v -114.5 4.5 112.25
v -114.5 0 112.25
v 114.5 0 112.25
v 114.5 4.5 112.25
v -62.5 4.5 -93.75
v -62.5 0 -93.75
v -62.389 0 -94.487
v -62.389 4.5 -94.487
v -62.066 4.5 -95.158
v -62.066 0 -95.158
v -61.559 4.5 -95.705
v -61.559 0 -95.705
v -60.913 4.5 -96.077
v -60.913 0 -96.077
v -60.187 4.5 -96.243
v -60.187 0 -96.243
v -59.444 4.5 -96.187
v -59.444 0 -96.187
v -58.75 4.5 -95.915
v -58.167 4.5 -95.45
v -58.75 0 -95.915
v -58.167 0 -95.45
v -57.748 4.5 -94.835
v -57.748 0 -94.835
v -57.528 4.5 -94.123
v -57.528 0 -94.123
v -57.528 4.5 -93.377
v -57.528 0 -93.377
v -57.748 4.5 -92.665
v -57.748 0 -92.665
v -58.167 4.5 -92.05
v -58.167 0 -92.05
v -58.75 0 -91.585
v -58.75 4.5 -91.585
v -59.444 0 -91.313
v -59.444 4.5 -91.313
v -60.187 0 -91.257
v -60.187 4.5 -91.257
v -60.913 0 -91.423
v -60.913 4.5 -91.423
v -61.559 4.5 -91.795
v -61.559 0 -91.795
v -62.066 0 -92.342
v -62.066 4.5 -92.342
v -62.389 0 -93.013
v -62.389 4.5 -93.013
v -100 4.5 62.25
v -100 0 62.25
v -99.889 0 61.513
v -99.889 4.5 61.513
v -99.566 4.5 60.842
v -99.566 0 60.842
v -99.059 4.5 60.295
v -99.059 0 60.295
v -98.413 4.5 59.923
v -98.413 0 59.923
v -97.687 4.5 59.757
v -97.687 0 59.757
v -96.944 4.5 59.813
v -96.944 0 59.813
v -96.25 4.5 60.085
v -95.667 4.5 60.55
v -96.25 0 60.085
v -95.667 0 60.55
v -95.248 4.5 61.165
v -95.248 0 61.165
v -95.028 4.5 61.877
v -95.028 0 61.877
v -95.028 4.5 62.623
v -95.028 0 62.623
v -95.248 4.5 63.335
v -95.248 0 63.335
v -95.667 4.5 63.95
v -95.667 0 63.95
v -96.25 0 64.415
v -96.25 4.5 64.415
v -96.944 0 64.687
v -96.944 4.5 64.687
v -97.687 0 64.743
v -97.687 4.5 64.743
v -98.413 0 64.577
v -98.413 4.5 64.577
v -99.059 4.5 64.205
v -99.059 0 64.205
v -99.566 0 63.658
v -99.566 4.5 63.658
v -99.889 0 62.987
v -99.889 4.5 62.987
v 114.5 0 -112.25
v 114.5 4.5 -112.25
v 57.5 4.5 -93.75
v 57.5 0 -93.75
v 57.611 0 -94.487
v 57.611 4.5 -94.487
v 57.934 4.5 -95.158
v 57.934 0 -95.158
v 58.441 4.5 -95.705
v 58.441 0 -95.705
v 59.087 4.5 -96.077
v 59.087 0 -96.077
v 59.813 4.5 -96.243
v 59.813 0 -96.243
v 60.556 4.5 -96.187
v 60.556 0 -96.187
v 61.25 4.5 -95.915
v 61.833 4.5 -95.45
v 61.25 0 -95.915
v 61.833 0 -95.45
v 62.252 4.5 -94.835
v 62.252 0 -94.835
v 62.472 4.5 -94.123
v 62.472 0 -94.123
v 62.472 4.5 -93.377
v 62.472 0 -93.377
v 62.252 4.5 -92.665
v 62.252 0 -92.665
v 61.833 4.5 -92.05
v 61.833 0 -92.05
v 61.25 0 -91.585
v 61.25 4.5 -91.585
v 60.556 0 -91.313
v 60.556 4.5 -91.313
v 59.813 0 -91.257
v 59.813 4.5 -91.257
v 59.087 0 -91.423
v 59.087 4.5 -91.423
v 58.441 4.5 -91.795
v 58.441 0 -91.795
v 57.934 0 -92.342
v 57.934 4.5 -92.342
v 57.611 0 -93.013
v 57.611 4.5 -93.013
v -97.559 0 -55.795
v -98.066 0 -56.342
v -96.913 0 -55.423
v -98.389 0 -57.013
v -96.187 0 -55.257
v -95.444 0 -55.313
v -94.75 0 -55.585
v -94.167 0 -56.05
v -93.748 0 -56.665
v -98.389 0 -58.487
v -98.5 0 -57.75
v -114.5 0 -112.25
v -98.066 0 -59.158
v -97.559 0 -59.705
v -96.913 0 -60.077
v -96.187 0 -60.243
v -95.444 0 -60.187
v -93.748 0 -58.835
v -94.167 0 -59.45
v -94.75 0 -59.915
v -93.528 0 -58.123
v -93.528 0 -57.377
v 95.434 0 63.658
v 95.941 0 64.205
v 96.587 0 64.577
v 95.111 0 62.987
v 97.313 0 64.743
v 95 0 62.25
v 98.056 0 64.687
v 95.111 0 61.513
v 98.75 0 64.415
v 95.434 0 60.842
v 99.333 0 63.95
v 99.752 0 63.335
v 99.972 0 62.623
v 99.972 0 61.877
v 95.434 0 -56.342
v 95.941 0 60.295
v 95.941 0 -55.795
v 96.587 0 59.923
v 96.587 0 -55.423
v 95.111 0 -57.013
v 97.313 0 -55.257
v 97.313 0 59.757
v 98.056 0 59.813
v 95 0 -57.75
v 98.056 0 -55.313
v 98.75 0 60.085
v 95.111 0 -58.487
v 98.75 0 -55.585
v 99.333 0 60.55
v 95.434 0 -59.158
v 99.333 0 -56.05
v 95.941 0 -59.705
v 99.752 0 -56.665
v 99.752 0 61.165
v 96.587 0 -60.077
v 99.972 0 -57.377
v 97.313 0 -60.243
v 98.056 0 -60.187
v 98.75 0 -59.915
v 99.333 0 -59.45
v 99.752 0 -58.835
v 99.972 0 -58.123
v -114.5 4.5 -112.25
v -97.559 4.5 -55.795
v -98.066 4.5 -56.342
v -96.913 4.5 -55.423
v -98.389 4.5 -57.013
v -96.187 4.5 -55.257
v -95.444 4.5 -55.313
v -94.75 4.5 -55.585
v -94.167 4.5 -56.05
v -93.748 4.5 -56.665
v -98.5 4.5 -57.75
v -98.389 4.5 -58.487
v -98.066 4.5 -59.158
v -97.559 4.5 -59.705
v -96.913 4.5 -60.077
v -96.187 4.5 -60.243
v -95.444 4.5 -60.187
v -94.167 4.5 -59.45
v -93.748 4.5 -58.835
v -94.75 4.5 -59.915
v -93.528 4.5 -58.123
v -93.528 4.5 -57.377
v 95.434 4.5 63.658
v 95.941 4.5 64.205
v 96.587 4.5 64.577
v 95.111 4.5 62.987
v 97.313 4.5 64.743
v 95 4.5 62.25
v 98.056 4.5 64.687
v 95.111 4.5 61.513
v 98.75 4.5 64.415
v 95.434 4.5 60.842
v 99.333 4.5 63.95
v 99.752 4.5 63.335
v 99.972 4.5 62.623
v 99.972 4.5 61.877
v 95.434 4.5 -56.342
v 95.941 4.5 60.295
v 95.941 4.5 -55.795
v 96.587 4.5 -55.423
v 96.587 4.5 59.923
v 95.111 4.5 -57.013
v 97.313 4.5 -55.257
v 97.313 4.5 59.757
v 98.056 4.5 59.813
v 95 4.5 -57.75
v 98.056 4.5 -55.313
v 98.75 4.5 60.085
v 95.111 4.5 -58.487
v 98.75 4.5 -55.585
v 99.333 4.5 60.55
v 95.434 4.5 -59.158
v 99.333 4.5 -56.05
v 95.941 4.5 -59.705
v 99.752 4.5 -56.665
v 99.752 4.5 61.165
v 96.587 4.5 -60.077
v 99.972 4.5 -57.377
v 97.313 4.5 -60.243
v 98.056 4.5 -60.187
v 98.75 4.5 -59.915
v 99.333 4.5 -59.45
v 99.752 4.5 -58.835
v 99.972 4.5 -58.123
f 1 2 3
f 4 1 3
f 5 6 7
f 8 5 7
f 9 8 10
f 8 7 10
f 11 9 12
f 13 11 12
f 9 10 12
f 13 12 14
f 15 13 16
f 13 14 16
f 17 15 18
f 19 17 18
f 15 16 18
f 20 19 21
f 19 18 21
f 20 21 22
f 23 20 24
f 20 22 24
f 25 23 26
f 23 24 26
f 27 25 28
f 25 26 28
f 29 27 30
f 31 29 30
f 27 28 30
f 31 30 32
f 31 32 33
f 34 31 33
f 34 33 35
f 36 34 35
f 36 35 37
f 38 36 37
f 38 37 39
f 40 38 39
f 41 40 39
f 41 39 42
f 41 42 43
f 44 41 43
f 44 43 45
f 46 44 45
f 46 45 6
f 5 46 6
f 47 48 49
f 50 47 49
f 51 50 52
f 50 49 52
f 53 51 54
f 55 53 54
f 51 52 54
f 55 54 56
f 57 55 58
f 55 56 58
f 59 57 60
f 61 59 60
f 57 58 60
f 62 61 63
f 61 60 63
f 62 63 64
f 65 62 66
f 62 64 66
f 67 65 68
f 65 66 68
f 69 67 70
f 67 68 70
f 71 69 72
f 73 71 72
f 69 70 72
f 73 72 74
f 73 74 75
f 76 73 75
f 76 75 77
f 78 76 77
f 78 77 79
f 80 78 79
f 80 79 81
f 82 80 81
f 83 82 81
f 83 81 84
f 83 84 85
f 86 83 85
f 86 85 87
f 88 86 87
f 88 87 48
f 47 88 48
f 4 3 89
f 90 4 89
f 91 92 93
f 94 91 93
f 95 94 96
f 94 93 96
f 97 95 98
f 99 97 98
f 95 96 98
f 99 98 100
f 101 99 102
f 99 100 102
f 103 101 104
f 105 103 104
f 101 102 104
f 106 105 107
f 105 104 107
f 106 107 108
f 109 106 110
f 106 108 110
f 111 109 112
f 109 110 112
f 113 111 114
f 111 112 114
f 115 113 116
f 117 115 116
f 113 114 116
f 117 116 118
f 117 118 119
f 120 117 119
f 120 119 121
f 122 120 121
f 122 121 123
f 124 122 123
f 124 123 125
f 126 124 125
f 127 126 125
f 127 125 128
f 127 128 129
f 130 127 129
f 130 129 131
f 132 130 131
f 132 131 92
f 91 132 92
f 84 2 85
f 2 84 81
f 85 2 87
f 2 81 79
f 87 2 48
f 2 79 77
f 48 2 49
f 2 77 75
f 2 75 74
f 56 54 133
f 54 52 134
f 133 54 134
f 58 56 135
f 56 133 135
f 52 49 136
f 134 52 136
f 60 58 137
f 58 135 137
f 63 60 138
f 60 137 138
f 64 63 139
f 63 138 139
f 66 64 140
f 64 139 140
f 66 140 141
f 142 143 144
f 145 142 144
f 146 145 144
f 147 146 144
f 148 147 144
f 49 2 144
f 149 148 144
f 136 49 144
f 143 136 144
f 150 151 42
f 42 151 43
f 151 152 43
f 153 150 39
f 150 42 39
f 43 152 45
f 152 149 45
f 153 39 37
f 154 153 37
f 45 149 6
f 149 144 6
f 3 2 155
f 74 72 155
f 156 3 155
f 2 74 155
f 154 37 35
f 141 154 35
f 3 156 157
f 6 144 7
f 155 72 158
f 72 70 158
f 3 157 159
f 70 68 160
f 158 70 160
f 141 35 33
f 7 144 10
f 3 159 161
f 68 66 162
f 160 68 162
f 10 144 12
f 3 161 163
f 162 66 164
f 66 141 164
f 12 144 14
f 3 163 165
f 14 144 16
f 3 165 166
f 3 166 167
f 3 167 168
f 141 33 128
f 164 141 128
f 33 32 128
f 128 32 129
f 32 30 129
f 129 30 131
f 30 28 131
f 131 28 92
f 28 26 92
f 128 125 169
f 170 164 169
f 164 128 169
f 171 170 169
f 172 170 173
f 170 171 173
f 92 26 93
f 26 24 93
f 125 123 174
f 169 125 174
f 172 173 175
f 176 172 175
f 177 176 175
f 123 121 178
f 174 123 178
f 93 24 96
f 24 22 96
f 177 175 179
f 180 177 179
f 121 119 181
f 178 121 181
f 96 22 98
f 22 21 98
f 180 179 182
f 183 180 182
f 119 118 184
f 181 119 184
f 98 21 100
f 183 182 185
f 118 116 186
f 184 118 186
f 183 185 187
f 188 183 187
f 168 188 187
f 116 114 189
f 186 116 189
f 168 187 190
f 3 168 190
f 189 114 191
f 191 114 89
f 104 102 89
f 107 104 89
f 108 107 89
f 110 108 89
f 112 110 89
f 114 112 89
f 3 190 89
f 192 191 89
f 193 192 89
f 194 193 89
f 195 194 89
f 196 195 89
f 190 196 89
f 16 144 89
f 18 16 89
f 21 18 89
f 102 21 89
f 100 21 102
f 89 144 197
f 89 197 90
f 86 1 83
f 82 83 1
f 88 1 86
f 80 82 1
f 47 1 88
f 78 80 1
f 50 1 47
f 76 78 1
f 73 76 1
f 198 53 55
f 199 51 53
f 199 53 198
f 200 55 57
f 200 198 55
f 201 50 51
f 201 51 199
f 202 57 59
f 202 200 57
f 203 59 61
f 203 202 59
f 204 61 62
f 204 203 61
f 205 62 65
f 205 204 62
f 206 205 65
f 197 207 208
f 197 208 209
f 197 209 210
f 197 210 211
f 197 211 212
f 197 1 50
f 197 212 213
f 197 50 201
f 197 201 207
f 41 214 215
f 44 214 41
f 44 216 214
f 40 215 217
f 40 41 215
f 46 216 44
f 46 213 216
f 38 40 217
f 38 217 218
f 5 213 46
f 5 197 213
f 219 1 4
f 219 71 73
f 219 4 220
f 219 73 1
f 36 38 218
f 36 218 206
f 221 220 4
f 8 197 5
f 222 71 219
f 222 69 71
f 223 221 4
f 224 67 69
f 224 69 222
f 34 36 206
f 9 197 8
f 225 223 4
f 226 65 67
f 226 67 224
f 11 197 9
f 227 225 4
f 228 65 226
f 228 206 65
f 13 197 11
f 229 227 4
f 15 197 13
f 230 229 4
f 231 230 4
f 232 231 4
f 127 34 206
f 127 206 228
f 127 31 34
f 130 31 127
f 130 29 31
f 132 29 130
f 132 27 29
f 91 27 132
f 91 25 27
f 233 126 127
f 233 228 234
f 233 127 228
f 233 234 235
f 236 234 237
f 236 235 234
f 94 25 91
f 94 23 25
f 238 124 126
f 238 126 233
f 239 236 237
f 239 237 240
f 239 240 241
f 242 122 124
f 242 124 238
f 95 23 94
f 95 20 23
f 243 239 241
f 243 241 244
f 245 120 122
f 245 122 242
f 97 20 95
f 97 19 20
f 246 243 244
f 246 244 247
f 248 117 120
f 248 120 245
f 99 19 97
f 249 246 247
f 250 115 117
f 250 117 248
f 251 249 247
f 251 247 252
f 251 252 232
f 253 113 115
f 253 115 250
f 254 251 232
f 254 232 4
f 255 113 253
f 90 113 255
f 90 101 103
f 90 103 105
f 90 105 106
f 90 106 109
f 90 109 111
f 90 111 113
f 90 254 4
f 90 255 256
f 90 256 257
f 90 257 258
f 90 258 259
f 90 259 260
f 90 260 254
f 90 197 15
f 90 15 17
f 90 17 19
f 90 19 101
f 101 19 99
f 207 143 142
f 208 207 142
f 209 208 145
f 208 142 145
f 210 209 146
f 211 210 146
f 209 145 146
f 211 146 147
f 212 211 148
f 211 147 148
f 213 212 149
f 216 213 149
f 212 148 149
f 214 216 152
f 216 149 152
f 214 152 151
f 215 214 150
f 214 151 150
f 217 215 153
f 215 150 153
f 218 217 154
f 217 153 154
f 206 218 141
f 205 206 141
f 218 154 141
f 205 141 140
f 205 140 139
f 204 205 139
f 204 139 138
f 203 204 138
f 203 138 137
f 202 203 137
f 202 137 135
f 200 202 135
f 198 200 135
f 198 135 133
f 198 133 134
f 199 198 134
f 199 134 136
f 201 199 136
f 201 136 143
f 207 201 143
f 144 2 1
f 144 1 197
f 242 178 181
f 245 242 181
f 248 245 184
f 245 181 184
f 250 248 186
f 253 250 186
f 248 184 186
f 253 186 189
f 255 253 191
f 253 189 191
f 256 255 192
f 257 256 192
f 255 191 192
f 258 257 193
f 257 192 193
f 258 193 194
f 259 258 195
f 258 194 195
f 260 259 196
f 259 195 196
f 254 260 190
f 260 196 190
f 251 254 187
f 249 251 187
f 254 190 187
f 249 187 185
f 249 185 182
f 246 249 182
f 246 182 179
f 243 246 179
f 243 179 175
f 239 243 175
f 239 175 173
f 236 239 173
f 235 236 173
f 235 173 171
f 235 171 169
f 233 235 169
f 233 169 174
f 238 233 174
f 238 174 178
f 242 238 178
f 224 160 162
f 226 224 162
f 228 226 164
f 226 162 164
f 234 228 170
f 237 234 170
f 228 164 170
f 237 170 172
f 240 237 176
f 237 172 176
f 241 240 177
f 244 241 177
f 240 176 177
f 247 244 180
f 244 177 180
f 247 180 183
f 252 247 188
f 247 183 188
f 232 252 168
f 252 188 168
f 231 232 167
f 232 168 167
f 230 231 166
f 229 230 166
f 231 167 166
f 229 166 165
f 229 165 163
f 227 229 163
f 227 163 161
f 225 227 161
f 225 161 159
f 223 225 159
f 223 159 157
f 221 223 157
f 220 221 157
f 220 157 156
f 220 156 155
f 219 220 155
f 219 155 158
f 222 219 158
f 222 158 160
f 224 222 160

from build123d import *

# Parameters (mm, degrees)
SKETCH1_W           = 229
SKETCH1_H           = 224.5
BOSS_EXTRUDE1_DEPTH = 4.5
CUT_EXTRUDE1_REACH  = 6.5
SKETCH2_R           = 2.5


with BuildPart() as part:
    # Sketch1 → Boss-Extrude1 (new body)
    with BuildSketch(Plane(origin=(0, 0, 0), x_dir=(1, 0, 0), z_dir=(0, 1, 0))):
        Rectangle(SKETCH1_W, SKETCH1_H)
    extrude(amount=BOSS_EXTRUDE1_DEPTH)

    # Sketch2 → Cut-Extrude1 (cut, up to next)
    with BuildSketch(Plane(origin=(0, 0, 0), x_dir=(-1, 0, 0), z_dir=(0, -1, 0)), mode=Mode.PRIVATE) as cut_extrude1_sk1:
        with Locations((97.5, -62.25)):
            Circle(SKETCH2_R)
    cut_extrude1_tool1 = extrude(cut_extrude1_sk1.sketch, amount=-CUT_EXTRUDE1_REACH, mode=Mode.PRIVATE) & part.part
    add(cut_extrude1_tool1.solids().sort_by_distance((-97.5, 0, 62.25))[0], mode=Mode.SUBTRACT)
    # Sketch2 → Cut-Extrude1 (cut, up to next)
    with BuildSketch(Plane(origin=(0, 0, 0), x_dir=(-1, 0, 0), z_dir=(0, -1, 0)), mode=Mode.PRIVATE) as cut_extrude1_sk2:
        with Locations((96, 57.75)):
            Circle(SKETCH2_R)
    cut_extrude1_tool2 = extrude(cut_extrude1_sk2.sketch, amount=-CUT_EXTRUDE1_REACH, mode=Mode.PRIVATE) & part.part
    add(cut_extrude1_tool2.solids().sort_by_distance((-96, 0, -57.75))[0], mode=Mode.SUBTRACT)
    # Sketch2 → Cut-Extrude1 (cut, up to next)
    with BuildSketch(Plane(origin=(0, 0, 0), x_dir=(-1, 0, 0), z_dir=(0, -1, 0)), mode=Mode.PRIVATE) as cut_extrude1_sk3:
        with Locations((60, 93.75)):
            Circle(SKETCH2_R)
    cut_extrude1_tool3 = extrude(cut_extrude1_sk3.sketch, amount=-CUT_EXTRUDE1_REACH, mode=Mode.PRIVATE) & part.part
    add(cut_extrude1_tool3.solids().sort_by_distance((-60, 0, -93.75))[0], mode=Mode.SUBTRACT)
    # Sketch2 → Cut-Extrude1 (cut, up to next)
    with BuildSketch(Plane(origin=(0, 0, 0), x_dir=(-1, 0, 0), z_dir=(0, -1, 0)), mode=Mode.PRIVATE) as cut_extrude1_sk4:
        with Locations((-60, 93.75)):
            Circle(SKETCH2_R)
    cut_extrude1_tool4 = extrude(cut_extrude1_sk4.sketch, amount=-CUT_EXTRUDE1_REACH, mode=Mode.PRIVATE) & part.part
    add(cut_extrude1_tool4.solids().sort_by_distance((60, 0, -93.75))[0], mode=Mode.SUBTRACT)
    # Sketch2 → Cut-Extrude1 (cut, up to next)
    with BuildSketch(Plane(origin=(0, 0, 0), x_dir=(-1, 0, 0), z_dir=(0, -1, 0)), mode=Mode.PRIVATE) as cut_extrude1_sk5:
        with Locations((-97.5, -62.25)):
            Circle(SKETCH2_R)
    cut_extrude1_tool5 = extrude(cut_extrude1_sk5.sketch, amount=-CUT_EXTRUDE1_REACH, mode=Mode.PRIVATE) & part.part
    add(cut_extrude1_tool5.solids().sort_by_distance((97.5, 0, 62.25))[0], mode=Mode.SUBTRACT)
    # Sketch2 → Cut-Extrude1 (cut, up to next)
    with BuildSketch(Plane(origin=(0, 0, 0), x_dir=(-1, 0, 0), z_dir=(0, -1, 0)), mode=Mode.PRIVATE) as cut_extrude1_sk6:
        with Locations((-97.5, 57.75)):
            Circle(SKETCH2_R)
    cut_extrude1_tool6 = extrude(cut_extrude1_sk6.sketch, amount=-CUT_EXTRUDE1_REACH, mode=Mode.PRIVATE) & part.part
    add(cut_extrude1_tool6.solids().sort_by_distance((97.5, 0, -57.75))[0], mode=Mode.SUBTRACT)


solid = part.part
